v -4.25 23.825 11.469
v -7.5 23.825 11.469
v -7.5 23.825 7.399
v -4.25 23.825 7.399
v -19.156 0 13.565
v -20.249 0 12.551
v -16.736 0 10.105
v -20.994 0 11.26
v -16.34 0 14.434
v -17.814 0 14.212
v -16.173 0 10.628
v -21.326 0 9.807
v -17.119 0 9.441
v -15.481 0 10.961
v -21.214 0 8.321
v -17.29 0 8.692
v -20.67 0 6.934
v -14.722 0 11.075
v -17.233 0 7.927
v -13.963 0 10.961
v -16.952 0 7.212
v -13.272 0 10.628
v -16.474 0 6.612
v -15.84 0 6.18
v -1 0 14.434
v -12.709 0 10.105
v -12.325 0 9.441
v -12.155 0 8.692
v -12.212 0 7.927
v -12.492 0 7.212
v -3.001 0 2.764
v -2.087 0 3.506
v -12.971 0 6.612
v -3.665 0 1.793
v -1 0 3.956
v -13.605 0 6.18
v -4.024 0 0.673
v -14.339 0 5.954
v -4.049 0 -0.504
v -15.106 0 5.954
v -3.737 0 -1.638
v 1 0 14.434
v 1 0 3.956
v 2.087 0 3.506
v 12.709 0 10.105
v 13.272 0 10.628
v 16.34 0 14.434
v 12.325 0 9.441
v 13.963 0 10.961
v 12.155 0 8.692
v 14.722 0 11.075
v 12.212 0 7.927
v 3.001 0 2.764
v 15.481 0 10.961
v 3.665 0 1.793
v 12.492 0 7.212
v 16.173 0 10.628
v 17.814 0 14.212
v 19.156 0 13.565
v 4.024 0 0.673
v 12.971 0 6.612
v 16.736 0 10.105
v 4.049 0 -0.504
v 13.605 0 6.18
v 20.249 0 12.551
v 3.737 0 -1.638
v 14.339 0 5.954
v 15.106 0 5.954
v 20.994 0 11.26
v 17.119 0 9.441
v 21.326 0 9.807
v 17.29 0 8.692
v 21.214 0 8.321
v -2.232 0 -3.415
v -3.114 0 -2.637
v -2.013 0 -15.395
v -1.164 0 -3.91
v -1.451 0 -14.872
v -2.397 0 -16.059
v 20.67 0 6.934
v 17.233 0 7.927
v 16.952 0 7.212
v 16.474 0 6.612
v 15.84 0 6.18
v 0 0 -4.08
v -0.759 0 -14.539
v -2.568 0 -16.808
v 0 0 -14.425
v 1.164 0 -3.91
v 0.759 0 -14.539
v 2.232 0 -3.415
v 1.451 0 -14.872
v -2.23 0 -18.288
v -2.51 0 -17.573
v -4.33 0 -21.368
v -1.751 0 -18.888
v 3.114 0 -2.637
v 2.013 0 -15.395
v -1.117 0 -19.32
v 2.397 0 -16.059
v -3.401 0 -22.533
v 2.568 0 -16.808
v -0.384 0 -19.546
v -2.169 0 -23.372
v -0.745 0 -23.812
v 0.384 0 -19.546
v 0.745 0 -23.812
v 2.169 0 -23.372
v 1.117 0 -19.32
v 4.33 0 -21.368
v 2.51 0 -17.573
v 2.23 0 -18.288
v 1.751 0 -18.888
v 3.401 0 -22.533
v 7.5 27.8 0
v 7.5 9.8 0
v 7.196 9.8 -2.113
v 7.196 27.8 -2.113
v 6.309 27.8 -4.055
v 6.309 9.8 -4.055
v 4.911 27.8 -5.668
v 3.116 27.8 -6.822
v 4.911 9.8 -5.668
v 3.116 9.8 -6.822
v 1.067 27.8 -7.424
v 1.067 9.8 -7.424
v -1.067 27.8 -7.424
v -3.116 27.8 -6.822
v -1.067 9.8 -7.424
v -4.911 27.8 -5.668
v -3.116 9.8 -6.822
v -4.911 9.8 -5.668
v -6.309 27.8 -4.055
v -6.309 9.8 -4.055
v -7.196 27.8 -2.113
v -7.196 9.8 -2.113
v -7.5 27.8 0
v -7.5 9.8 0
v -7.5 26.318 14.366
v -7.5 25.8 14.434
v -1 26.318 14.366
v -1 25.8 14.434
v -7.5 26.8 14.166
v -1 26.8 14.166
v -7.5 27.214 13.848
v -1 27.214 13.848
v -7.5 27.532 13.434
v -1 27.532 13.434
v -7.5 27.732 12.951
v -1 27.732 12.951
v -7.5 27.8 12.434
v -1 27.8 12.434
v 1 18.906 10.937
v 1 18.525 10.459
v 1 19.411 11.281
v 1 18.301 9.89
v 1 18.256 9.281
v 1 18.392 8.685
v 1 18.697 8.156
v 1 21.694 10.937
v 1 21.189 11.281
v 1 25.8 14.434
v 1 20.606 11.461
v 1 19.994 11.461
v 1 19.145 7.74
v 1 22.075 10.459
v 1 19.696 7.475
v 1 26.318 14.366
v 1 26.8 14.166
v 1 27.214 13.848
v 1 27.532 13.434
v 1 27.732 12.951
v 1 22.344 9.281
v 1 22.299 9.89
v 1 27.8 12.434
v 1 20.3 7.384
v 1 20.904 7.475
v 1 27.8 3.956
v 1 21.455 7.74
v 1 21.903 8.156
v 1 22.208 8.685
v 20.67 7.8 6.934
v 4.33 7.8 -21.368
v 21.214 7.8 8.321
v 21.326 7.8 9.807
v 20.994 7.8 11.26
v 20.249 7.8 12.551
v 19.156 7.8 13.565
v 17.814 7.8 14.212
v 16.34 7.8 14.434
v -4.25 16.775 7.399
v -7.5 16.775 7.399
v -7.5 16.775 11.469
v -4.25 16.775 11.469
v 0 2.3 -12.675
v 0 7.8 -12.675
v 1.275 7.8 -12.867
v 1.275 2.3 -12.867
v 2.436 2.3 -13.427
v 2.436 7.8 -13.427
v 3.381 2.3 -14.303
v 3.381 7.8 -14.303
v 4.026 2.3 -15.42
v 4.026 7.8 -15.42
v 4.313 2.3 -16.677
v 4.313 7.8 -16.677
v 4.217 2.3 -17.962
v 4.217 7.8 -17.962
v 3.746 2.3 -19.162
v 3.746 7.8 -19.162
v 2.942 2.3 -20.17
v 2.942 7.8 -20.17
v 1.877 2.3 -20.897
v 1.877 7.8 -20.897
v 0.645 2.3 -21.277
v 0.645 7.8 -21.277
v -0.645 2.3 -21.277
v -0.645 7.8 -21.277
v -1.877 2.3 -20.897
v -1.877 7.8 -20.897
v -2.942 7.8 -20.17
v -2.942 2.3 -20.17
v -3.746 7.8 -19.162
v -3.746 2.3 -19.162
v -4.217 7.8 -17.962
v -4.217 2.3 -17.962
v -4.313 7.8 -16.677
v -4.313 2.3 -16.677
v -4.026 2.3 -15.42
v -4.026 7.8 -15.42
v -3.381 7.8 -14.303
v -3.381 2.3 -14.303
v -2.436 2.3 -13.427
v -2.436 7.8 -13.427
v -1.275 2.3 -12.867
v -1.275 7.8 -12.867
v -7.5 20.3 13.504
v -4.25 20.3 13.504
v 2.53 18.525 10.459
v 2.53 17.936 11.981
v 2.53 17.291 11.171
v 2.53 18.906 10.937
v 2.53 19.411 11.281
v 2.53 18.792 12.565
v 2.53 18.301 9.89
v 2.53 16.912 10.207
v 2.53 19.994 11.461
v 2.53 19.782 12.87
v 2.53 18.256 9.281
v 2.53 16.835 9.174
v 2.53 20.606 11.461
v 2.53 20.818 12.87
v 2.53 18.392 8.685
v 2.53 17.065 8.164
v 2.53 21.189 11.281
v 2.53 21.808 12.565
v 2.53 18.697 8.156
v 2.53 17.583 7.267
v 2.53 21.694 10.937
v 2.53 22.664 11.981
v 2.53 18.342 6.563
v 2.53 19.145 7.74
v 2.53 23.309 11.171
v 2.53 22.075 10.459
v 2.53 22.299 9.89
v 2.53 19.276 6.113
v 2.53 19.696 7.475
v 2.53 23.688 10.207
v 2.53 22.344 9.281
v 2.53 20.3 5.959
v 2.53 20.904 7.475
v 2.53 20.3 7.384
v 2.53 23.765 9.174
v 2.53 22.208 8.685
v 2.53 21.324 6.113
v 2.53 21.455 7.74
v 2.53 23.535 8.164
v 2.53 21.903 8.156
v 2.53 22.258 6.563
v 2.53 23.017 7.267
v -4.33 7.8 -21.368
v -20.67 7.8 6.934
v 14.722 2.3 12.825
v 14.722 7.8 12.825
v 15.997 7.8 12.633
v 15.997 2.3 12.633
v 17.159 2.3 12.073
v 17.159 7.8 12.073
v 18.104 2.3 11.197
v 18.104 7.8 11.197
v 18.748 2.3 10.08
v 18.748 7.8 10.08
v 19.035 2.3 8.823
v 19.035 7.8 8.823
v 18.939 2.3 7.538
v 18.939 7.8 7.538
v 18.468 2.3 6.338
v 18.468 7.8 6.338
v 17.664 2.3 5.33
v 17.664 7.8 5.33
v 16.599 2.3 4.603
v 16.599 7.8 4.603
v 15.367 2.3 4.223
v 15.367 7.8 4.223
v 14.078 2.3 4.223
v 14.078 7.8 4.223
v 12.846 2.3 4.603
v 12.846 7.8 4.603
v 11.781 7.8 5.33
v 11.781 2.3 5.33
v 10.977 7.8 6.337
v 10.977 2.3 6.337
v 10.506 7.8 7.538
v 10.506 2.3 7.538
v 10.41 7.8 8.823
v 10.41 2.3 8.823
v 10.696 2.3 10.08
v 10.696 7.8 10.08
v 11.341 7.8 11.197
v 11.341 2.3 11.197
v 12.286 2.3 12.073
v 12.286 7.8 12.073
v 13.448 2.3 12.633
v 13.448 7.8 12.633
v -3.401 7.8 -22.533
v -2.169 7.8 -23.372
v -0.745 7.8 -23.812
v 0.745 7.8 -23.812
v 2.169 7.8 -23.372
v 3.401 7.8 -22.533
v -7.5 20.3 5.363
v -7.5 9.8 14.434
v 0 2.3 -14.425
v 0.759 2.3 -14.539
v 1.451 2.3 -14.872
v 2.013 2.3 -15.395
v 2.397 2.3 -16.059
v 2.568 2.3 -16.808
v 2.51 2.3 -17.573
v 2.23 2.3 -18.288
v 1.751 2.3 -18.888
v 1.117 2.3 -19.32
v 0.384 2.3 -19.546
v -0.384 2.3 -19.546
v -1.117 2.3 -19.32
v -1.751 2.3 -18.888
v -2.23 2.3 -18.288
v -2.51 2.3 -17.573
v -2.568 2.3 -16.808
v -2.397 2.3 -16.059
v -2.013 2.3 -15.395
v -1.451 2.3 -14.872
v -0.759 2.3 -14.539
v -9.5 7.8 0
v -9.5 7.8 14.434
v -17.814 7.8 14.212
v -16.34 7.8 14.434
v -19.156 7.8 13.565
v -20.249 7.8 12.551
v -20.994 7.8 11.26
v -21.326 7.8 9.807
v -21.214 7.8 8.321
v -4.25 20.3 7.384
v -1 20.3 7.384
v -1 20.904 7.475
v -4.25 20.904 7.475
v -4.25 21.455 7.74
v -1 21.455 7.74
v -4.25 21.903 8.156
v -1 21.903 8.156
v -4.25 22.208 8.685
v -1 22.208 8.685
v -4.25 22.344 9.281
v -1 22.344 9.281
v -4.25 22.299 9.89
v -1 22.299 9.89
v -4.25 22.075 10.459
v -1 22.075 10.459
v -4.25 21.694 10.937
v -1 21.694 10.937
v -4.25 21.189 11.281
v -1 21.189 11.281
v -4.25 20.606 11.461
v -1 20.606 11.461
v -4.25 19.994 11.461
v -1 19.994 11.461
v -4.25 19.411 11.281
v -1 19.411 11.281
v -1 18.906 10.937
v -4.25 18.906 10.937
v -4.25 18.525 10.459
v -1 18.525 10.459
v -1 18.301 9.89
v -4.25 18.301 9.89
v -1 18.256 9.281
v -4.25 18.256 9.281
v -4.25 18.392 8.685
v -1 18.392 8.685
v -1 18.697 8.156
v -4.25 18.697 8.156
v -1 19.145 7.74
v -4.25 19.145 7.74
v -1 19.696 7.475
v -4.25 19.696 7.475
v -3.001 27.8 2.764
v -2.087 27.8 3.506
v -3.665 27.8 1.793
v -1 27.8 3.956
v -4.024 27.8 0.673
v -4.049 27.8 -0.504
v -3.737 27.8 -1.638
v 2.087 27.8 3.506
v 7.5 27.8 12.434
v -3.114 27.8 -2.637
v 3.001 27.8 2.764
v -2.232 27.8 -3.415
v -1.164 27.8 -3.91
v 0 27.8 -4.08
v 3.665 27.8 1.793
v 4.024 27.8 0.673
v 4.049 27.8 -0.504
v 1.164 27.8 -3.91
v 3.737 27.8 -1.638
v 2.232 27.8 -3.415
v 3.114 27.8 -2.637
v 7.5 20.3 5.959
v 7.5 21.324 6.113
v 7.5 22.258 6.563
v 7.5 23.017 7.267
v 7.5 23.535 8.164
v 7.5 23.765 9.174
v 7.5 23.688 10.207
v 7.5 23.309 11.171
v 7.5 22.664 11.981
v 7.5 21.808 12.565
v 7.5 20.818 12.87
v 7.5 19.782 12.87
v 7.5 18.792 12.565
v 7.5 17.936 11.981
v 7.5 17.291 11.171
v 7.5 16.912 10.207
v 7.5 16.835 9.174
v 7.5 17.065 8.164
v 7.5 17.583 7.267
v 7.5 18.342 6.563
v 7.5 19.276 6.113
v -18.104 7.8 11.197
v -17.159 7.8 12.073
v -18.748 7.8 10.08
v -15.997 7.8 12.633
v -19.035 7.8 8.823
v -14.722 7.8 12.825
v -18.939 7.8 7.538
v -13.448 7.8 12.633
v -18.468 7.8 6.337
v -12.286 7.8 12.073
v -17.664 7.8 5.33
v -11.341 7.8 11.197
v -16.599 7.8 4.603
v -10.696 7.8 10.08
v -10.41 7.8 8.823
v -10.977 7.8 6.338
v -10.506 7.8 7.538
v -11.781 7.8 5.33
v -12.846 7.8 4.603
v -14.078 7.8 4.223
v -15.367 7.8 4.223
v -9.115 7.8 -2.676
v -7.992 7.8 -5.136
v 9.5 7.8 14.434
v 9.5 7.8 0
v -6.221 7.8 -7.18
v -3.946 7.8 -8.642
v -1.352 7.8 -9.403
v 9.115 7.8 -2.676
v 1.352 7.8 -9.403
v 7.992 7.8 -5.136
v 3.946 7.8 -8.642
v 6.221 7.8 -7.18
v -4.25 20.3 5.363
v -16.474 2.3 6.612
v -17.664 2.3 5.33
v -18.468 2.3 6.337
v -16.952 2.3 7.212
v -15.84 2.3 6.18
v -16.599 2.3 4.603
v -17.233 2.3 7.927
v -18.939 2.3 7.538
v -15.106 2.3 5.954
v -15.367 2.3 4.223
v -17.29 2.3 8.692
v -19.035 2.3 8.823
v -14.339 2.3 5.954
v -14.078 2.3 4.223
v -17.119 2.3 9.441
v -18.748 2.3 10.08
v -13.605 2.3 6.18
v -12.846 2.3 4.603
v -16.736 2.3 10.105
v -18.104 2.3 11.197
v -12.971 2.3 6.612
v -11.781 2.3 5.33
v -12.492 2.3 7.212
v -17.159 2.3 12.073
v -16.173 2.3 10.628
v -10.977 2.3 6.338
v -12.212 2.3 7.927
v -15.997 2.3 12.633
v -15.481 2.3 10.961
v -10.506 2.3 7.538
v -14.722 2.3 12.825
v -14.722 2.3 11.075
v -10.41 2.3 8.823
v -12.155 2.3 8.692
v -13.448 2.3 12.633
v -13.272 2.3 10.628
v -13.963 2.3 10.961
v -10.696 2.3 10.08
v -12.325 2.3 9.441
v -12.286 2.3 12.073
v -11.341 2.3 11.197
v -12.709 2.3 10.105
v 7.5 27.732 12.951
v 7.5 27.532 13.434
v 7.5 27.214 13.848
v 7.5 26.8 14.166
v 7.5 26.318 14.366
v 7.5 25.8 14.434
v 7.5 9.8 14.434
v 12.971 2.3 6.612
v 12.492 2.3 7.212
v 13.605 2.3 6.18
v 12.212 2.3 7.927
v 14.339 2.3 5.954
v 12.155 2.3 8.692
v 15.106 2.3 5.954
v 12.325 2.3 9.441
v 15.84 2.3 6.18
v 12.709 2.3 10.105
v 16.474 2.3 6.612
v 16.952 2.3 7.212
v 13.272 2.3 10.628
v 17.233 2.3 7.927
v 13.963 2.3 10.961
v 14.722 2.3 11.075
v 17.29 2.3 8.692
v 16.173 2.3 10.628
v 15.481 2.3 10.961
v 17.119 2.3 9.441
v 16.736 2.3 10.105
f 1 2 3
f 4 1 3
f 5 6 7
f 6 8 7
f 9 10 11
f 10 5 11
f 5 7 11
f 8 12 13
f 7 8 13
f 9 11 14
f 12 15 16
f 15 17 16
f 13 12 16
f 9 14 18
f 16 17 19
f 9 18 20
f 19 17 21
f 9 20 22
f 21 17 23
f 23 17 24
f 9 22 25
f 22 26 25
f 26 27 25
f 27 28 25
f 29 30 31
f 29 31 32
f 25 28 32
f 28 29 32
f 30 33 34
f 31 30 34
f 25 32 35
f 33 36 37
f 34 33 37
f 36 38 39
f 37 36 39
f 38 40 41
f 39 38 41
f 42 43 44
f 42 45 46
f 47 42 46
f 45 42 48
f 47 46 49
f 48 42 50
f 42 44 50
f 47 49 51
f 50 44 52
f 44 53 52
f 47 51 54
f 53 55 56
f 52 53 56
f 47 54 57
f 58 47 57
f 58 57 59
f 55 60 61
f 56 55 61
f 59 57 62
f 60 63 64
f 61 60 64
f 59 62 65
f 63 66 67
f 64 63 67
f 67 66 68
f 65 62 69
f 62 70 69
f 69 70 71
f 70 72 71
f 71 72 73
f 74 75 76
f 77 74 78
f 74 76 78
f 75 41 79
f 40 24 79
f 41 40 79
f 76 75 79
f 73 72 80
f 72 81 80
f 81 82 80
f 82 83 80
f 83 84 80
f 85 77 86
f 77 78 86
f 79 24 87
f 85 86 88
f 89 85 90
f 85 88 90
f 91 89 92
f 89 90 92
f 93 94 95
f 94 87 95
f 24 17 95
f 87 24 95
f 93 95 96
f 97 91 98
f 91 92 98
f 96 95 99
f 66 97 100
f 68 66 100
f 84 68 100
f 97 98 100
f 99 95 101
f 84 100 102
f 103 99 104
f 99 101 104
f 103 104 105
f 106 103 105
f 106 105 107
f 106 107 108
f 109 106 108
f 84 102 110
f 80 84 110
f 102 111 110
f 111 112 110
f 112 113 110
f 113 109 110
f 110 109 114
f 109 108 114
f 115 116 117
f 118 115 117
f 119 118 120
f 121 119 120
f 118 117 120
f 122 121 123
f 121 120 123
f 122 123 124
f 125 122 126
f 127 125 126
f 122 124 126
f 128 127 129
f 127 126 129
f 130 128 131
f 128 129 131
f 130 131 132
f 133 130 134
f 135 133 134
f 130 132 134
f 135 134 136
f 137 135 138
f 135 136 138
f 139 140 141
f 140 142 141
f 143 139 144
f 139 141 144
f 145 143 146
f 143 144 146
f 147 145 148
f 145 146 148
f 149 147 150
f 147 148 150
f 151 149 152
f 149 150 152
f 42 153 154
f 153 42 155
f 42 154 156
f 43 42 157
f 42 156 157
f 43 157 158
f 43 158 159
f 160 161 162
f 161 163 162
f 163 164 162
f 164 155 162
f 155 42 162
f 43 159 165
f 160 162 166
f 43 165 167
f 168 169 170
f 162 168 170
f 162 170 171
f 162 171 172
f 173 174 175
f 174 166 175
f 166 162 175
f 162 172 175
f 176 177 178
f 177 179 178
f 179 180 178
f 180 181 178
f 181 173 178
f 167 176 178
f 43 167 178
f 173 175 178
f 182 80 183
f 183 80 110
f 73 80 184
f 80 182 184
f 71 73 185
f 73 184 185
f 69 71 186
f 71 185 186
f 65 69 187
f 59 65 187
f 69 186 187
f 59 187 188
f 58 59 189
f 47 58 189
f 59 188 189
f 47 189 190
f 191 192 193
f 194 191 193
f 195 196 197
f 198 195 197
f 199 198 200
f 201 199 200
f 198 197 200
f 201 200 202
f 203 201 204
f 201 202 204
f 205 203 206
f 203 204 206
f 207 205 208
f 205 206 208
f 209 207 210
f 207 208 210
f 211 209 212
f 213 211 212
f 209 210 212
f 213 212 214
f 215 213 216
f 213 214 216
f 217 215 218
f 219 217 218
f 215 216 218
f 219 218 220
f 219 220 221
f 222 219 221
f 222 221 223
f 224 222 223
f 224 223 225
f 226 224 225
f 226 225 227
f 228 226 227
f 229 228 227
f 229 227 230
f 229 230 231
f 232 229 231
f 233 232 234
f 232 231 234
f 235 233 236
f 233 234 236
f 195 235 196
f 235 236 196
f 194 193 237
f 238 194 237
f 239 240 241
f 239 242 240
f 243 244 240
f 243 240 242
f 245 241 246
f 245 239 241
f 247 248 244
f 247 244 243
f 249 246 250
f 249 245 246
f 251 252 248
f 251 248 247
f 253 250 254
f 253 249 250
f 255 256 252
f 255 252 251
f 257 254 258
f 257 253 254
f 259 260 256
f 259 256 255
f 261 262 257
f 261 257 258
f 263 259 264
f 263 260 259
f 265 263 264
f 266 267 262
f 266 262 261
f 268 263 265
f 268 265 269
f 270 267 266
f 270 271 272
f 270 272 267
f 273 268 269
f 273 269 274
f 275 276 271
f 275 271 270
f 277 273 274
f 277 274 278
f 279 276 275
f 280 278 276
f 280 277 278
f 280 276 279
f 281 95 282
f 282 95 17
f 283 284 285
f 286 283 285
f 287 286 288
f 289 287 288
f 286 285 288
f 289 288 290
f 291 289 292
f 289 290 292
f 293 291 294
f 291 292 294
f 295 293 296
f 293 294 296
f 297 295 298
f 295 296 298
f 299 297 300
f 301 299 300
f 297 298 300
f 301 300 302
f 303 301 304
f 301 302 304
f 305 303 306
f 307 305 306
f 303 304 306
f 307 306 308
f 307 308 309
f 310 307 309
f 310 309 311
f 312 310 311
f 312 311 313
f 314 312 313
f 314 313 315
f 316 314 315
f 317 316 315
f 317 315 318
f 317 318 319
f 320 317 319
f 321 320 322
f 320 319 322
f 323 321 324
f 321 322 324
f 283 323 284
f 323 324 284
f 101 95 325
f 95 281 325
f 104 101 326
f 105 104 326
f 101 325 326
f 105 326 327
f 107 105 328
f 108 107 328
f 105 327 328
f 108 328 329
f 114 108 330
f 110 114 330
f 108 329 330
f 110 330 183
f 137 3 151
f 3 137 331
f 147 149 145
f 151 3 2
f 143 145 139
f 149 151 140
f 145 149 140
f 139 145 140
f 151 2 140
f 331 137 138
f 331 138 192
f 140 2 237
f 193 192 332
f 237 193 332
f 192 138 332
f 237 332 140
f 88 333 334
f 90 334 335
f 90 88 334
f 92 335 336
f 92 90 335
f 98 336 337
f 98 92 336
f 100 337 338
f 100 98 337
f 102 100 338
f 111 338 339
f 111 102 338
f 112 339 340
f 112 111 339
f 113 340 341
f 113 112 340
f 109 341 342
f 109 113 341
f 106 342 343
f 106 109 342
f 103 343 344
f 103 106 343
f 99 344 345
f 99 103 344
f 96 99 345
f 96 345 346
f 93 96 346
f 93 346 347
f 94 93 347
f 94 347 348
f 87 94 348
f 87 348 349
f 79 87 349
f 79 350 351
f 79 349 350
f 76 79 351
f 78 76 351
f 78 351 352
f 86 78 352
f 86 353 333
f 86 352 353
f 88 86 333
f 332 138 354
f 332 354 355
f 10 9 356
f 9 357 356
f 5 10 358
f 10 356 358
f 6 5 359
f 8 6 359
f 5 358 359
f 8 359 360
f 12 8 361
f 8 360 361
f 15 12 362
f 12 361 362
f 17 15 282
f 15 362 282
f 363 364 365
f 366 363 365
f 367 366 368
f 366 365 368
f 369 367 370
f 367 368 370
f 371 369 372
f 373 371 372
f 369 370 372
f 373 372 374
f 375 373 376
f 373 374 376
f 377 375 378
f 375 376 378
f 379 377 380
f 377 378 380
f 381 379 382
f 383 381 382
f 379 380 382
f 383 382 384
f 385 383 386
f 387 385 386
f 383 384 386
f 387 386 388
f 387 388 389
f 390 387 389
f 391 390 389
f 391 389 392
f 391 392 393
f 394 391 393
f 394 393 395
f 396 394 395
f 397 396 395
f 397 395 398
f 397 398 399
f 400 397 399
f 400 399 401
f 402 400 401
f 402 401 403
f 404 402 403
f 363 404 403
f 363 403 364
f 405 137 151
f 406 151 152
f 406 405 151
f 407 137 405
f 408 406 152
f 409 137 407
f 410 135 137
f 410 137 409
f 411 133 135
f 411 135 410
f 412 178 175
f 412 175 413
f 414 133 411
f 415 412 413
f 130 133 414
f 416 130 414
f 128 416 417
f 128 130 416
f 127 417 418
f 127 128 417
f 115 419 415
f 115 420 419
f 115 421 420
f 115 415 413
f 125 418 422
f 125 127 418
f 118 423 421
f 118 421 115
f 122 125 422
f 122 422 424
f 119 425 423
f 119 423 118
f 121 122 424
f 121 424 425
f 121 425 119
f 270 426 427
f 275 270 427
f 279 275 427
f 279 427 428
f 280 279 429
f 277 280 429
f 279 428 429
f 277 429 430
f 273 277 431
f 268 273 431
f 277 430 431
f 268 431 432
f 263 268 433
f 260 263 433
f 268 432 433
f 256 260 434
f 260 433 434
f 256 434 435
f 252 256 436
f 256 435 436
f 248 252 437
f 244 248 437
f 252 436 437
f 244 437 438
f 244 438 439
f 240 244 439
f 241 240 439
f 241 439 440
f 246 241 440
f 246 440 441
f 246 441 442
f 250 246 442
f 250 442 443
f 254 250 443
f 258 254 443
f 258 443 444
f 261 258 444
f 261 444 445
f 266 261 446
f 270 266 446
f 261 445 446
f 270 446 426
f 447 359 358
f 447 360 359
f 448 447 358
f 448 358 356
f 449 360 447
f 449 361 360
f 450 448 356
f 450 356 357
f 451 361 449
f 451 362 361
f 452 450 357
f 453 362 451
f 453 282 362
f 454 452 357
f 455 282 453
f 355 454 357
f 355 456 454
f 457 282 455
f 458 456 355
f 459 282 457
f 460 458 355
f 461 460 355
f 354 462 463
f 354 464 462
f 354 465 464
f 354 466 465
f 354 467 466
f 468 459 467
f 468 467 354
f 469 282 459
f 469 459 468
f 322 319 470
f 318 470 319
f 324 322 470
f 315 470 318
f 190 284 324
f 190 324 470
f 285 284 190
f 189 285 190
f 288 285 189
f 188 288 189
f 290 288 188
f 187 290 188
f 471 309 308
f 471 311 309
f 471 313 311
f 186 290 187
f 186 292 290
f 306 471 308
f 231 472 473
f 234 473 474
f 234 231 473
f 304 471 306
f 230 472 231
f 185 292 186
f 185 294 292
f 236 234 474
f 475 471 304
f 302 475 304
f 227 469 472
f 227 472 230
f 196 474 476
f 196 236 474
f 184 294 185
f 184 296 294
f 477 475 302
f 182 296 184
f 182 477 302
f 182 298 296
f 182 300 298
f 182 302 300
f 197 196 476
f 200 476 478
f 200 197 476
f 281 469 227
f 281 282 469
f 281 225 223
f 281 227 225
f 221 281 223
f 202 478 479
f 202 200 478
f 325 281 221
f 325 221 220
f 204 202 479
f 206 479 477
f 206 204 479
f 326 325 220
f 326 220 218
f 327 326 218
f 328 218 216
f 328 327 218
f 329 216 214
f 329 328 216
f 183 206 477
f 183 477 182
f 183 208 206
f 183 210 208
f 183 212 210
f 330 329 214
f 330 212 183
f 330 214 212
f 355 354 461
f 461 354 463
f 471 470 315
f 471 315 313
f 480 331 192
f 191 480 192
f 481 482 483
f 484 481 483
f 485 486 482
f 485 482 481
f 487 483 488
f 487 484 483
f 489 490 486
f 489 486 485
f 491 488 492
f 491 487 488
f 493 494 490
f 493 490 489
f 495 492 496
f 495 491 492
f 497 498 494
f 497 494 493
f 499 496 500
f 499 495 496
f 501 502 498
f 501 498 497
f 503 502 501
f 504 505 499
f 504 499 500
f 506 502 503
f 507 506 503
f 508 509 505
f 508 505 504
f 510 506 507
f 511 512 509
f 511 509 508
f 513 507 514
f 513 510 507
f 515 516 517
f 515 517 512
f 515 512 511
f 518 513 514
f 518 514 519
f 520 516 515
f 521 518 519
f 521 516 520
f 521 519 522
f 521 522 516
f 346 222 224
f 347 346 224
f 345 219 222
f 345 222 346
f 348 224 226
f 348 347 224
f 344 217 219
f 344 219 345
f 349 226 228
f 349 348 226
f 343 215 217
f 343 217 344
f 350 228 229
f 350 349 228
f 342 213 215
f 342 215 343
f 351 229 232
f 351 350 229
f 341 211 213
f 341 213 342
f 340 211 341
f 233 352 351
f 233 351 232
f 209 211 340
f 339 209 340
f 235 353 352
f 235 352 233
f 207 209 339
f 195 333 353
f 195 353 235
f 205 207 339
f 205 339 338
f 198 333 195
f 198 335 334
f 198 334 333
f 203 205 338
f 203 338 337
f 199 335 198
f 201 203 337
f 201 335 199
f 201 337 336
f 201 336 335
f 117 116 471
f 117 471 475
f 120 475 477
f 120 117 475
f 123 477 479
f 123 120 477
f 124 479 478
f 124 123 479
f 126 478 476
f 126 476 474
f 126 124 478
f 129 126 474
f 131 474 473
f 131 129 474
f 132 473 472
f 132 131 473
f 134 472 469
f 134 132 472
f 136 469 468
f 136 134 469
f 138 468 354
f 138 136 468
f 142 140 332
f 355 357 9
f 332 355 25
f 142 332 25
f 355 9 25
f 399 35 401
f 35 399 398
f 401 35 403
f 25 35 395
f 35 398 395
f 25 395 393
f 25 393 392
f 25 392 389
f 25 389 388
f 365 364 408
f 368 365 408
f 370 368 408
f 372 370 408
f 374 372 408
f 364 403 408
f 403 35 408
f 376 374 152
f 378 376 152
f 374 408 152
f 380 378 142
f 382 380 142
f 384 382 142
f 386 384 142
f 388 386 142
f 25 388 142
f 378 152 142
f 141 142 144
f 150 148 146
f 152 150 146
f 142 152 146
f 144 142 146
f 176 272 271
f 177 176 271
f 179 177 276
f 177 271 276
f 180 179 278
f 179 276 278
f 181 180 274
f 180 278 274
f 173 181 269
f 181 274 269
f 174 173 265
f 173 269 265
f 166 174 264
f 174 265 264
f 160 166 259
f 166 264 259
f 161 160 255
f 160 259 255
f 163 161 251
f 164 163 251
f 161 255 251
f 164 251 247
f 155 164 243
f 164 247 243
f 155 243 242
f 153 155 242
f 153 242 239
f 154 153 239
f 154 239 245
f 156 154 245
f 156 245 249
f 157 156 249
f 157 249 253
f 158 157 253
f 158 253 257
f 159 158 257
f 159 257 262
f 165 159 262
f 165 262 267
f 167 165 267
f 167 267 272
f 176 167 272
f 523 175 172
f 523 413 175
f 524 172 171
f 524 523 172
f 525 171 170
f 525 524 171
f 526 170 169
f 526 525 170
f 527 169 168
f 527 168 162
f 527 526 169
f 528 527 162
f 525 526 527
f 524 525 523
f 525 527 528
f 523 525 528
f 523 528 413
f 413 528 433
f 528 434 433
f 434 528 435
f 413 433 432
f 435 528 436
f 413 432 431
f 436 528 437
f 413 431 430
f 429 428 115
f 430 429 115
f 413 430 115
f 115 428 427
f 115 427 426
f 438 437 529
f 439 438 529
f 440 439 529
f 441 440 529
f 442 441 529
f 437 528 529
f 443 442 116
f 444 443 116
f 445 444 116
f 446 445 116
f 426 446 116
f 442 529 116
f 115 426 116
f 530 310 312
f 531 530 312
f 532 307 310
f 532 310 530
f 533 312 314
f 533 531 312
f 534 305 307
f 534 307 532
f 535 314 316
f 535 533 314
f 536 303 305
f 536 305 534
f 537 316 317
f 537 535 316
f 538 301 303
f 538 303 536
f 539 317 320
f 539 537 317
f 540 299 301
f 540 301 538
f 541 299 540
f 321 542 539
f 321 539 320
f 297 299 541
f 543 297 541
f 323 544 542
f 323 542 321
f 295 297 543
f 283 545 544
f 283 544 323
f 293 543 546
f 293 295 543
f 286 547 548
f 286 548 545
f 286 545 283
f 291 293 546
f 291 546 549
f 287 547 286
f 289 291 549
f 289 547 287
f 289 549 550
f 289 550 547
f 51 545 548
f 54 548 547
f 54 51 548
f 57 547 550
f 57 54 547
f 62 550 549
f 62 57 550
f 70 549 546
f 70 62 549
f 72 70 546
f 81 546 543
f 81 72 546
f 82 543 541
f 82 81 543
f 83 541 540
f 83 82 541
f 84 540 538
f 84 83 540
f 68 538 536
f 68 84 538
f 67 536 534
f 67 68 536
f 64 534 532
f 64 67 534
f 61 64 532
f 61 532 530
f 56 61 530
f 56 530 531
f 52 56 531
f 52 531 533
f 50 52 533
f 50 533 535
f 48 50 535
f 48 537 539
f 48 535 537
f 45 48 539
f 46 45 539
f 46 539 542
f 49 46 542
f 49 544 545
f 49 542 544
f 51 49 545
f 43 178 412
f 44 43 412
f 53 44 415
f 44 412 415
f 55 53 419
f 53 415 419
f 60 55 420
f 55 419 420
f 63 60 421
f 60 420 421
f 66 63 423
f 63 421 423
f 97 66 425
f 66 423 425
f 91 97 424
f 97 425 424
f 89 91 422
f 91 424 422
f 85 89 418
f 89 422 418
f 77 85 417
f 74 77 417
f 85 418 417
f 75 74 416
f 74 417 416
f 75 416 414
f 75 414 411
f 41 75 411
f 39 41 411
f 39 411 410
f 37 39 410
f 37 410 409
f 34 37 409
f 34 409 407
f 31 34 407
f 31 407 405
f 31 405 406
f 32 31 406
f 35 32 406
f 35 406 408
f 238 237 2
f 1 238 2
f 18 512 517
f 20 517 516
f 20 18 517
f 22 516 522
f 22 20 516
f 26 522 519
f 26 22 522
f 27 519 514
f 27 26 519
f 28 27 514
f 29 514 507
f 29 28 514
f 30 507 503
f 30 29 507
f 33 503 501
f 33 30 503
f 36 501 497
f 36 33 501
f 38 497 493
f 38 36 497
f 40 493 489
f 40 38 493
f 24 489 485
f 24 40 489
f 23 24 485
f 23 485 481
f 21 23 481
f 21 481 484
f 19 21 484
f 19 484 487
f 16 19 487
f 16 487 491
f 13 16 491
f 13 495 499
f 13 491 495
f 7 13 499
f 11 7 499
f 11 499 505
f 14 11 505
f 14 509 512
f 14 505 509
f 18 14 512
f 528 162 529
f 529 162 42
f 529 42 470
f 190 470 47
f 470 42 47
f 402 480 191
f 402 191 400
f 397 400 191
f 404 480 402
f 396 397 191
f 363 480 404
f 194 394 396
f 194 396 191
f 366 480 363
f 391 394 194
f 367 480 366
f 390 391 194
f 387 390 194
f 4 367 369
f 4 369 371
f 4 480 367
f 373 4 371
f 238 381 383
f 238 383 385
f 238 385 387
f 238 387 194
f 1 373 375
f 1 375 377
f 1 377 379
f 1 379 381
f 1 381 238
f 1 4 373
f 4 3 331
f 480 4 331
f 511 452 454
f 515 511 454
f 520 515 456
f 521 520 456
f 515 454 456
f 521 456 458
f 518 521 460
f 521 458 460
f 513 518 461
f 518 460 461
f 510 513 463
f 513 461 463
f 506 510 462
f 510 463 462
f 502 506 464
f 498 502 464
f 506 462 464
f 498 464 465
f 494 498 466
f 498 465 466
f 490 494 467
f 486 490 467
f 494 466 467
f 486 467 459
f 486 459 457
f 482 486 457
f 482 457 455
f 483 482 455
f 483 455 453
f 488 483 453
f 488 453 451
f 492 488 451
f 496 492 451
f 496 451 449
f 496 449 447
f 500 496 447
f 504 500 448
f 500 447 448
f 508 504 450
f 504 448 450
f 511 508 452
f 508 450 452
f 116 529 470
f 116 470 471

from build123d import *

# Parameters (mm, degrees)
ESQUISSE5_R             = 2.575
BOSS_EXTRU_2_DEPTH      = 7.8
ESQUISSE6_R             = 7.5
BOSS_EXTRU_3_DEPTH      = 20
BOSS_EXTRU_6_START      = -20
BOSS_EXTRU_6_DEPTH      = 20
ESQUISSE14_R            = 4.08
ENL_V_MAT_EXTRU_4_DEPTH = 48.235297536
ENL_V_MAT_EXTRU_5_DEPTH = 48.235297536
CONG_2_R                = 5
ESQUISSE17_R            = 2.05
ENL_V_MAT_EXTRU_6_DEPTH = 47.62863011
ENL_V_MAT_EXTRU_7_DEPTH = 3.25
ESQUISSE19_R            = 4.325
ENL_V_MAT_EXTRU_8_DEPTH = 5.5
ESQUISSE20_R            = 3.475
ENL_V_MAT_EXTRU_9_DEPTH = 4.97
CONG_3_R                = 2
CHANFREIN2_SIZE         = 2


with BuildPart() as part:
    # Esquisse5 → Boss.-Extru.2 (new body)
    with BuildSketch(Plane(origin=(0, 0, 0), x_dir=(1, 0, 0), z_dir=(0, 1, 0))):
        Polygon((-25, -14.43375673), (25, -14.43375673), (0, 28.867513459), align=None)
        with Locations(Location((0, 17, 0), (0, 0, 270))):
            Circle(ESQUISSE5_R, mode=Mode.SUBTRACT)
        with Locations(Location((-14.722431864, -8.5, 0), (0, 0, 270))):
            Circle(ESQUISSE5_R, mode=Mode.SUBTRACT)
        with Locations(Location((14.722431864, -8.5, 0), (0, 0, 270))):
            Circle(ESQUISSE5_R, mode=Mode.SUBTRACT)
    extrude(amount=BOSS_EXTRU_2_DEPTH)

    # Esquisse6 → Boss.-Extru.3 (add)
    with BuildSketch(Plane(origin=(0, 7.8, 0), x_dir=(1, 0, 0), z_dir=(0, 1, 0))):
        with Locations(Location((0, 0, 0), (0, 0, 270))):
            Circle(ESQUISSE6_R)
    extrude(amount=BOSS_EXTRU_3_DEPTH)

    # Esquisse13 → Boss.-Extru.6 (add)
    with BuildSketch(Plane(origin=(0, 27.8, 0), x_dir=(1, 0, 0), z_dir=(0, 1, 0)).offset(BOSS_EXTRU_6_START)):
        with BuildLine():
            Line((-7.5, 0), (-7.5, -14.43375673))
            Line((-7.5, -14.43375673), (7.5, -14.43375673))
            Line((7.5, -14.43375673), (7.5, 0))
            ThreePointArc((7.5, 0), (0, -7.5), (-7.5, 0))
        make_face()
    extrude(amount=BOSS_EXTRU_6_DEPTH)

    # Esquisse14 → Enlèv. mat.-Extru.4 (cut, through all)
    with BuildSketch(Plane(origin=(0, 27.8, 0), x_dir=(1, 0, 0), z_dir=(0, 1, 0))):
        with Locations(Location((0, 0, 0), (0, 0, 270))):
            Circle(ESQUISSE14_R)
    extrude(amount=-ENL_V_MAT_EXTRU_4_DEPTH, mode=Mode.SUBTRACT)

    # Esquisse15 → Enlèv. mat.-Extru.5 (cut, through all)
    with BuildSketch(Plane(origin=(0, 27.8, 0), x_dir=(1, 0, 0), z_dir=(0, 1, 0))):
        with BuildLine():
            Line((-1, -3.955553059), (-1, -14.43375673))
            Line((-1, -14.43375673), (1, -14.43375673))
            Line((1, -14.43375673), (1, -3.955553059))
            ThreePointArc((1, -3.955553059), (0, -4.08), (-1, -3.955553059))
        make_face()
    extrude(amount=-ENL_V_MAT_EXTRU_5_DEPTH, mode=Mode.SUBTRACT)

    # Congé2
    cong_2_edges = [part.edges().sort_by_distance(p)[0] for p in [
        (0, 3.9, -28.867513459),
        (25, 3.9, 14.43375673),
        (-25, 3.9, 14.43375673),
    ]]
    fillet(cong_2_edges, radius=CONG_2_R)

    # Esquisse17 → Enlèv. mat.-Extru.6 (cut, through all)
    with BuildSketch(Plane(origin=(7.5, 0, 0), x_dir=(0, 0, -1), z_dir=(1, 0, 0))):
        with Locations((-9.43375673, 20.3)):
            Circle(ESQUISSE17_R)
    extrude(amount=-ENL_V_MAT_EXTRU_6_DEPTH, mode=Mode.SUBTRACT)

    # Esquisse18 → Enlèv. mat.-Extru.7 (cut)
    with BuildSketch(Plane.ZY.offset(7.5)):
        Polygon((11.468916429, 23.825), (7.398597031, 23.825), (5.363437332, 20.3), (7.398597031, 16.775), (11.468916429, 16.775), (13.504076128, 20.3), align=None)
    extrude(amount=-ENL_V_MAT_EXTRU_7_DEPTH, mode=Mode.SUBTRACT)

    # Esquisse19 → Enlèv. mat.-Extru.8 (cut)
    with BuildSketch(Plane(origin=(0, 7.8, 0), x_dir=(1, 0, 0), z_dir=(0, 1, 0))):
        with Locations(Location((0, 17, 0), (0, 0, 270))):
            Circle(ESQUISSE19_R)
        with Locations(Location((14.722431864, -8.5, 0), (0, 0, 270))):
            Circle(ESQUISSE19_R)
        with Locations(Location((-14.722431864, -8.5, 0), (0, 0, 270))):
            Circle(ESQUISSE19_R)
    extrude(amount=-ENL_V_MAT_EXTRU_8_DEPTH, mode=Mode.SUBTRACT)

    # Esquisse20 → Enlèv. mat.-Extru.9 (cut)
    with BuildSketch(Plane(origin=(7.5, 0, 0), x_dir=(0, 0, -1), z_dir=(1, 0, 0))):
        with Locations((-9.43375673, 20.3)):
            Circle(ESQUISSE20_R)
    extrude(amount=-ENL_V_MAT_EXTRU_9_DEPTH, mode=Mode.SUBTRACT)

    # Congé3
    cong_3_edges = [part.edges().sort_by_distance(p)[0] for p in [
        (-4.25, 27.8, 14.43375673),
        (4.25, 27.8, 14.43375673),
    ]]
    fillet(cong_3_edges, radius=CONG_3_R)

    # Chanfrein2
    chanfrein2_edges = [part.edges().sort_by_distance(p)[0] for p in [
        (0, 7.8, -7.5),
        (7.5, 7.8, 7.216878365),
        (-7.5, 7.8, 7.216878365),
    ]]
    chamfer(chanfrein2_edges, length=CHANFREIN2_SIZE)


solid = part.part
